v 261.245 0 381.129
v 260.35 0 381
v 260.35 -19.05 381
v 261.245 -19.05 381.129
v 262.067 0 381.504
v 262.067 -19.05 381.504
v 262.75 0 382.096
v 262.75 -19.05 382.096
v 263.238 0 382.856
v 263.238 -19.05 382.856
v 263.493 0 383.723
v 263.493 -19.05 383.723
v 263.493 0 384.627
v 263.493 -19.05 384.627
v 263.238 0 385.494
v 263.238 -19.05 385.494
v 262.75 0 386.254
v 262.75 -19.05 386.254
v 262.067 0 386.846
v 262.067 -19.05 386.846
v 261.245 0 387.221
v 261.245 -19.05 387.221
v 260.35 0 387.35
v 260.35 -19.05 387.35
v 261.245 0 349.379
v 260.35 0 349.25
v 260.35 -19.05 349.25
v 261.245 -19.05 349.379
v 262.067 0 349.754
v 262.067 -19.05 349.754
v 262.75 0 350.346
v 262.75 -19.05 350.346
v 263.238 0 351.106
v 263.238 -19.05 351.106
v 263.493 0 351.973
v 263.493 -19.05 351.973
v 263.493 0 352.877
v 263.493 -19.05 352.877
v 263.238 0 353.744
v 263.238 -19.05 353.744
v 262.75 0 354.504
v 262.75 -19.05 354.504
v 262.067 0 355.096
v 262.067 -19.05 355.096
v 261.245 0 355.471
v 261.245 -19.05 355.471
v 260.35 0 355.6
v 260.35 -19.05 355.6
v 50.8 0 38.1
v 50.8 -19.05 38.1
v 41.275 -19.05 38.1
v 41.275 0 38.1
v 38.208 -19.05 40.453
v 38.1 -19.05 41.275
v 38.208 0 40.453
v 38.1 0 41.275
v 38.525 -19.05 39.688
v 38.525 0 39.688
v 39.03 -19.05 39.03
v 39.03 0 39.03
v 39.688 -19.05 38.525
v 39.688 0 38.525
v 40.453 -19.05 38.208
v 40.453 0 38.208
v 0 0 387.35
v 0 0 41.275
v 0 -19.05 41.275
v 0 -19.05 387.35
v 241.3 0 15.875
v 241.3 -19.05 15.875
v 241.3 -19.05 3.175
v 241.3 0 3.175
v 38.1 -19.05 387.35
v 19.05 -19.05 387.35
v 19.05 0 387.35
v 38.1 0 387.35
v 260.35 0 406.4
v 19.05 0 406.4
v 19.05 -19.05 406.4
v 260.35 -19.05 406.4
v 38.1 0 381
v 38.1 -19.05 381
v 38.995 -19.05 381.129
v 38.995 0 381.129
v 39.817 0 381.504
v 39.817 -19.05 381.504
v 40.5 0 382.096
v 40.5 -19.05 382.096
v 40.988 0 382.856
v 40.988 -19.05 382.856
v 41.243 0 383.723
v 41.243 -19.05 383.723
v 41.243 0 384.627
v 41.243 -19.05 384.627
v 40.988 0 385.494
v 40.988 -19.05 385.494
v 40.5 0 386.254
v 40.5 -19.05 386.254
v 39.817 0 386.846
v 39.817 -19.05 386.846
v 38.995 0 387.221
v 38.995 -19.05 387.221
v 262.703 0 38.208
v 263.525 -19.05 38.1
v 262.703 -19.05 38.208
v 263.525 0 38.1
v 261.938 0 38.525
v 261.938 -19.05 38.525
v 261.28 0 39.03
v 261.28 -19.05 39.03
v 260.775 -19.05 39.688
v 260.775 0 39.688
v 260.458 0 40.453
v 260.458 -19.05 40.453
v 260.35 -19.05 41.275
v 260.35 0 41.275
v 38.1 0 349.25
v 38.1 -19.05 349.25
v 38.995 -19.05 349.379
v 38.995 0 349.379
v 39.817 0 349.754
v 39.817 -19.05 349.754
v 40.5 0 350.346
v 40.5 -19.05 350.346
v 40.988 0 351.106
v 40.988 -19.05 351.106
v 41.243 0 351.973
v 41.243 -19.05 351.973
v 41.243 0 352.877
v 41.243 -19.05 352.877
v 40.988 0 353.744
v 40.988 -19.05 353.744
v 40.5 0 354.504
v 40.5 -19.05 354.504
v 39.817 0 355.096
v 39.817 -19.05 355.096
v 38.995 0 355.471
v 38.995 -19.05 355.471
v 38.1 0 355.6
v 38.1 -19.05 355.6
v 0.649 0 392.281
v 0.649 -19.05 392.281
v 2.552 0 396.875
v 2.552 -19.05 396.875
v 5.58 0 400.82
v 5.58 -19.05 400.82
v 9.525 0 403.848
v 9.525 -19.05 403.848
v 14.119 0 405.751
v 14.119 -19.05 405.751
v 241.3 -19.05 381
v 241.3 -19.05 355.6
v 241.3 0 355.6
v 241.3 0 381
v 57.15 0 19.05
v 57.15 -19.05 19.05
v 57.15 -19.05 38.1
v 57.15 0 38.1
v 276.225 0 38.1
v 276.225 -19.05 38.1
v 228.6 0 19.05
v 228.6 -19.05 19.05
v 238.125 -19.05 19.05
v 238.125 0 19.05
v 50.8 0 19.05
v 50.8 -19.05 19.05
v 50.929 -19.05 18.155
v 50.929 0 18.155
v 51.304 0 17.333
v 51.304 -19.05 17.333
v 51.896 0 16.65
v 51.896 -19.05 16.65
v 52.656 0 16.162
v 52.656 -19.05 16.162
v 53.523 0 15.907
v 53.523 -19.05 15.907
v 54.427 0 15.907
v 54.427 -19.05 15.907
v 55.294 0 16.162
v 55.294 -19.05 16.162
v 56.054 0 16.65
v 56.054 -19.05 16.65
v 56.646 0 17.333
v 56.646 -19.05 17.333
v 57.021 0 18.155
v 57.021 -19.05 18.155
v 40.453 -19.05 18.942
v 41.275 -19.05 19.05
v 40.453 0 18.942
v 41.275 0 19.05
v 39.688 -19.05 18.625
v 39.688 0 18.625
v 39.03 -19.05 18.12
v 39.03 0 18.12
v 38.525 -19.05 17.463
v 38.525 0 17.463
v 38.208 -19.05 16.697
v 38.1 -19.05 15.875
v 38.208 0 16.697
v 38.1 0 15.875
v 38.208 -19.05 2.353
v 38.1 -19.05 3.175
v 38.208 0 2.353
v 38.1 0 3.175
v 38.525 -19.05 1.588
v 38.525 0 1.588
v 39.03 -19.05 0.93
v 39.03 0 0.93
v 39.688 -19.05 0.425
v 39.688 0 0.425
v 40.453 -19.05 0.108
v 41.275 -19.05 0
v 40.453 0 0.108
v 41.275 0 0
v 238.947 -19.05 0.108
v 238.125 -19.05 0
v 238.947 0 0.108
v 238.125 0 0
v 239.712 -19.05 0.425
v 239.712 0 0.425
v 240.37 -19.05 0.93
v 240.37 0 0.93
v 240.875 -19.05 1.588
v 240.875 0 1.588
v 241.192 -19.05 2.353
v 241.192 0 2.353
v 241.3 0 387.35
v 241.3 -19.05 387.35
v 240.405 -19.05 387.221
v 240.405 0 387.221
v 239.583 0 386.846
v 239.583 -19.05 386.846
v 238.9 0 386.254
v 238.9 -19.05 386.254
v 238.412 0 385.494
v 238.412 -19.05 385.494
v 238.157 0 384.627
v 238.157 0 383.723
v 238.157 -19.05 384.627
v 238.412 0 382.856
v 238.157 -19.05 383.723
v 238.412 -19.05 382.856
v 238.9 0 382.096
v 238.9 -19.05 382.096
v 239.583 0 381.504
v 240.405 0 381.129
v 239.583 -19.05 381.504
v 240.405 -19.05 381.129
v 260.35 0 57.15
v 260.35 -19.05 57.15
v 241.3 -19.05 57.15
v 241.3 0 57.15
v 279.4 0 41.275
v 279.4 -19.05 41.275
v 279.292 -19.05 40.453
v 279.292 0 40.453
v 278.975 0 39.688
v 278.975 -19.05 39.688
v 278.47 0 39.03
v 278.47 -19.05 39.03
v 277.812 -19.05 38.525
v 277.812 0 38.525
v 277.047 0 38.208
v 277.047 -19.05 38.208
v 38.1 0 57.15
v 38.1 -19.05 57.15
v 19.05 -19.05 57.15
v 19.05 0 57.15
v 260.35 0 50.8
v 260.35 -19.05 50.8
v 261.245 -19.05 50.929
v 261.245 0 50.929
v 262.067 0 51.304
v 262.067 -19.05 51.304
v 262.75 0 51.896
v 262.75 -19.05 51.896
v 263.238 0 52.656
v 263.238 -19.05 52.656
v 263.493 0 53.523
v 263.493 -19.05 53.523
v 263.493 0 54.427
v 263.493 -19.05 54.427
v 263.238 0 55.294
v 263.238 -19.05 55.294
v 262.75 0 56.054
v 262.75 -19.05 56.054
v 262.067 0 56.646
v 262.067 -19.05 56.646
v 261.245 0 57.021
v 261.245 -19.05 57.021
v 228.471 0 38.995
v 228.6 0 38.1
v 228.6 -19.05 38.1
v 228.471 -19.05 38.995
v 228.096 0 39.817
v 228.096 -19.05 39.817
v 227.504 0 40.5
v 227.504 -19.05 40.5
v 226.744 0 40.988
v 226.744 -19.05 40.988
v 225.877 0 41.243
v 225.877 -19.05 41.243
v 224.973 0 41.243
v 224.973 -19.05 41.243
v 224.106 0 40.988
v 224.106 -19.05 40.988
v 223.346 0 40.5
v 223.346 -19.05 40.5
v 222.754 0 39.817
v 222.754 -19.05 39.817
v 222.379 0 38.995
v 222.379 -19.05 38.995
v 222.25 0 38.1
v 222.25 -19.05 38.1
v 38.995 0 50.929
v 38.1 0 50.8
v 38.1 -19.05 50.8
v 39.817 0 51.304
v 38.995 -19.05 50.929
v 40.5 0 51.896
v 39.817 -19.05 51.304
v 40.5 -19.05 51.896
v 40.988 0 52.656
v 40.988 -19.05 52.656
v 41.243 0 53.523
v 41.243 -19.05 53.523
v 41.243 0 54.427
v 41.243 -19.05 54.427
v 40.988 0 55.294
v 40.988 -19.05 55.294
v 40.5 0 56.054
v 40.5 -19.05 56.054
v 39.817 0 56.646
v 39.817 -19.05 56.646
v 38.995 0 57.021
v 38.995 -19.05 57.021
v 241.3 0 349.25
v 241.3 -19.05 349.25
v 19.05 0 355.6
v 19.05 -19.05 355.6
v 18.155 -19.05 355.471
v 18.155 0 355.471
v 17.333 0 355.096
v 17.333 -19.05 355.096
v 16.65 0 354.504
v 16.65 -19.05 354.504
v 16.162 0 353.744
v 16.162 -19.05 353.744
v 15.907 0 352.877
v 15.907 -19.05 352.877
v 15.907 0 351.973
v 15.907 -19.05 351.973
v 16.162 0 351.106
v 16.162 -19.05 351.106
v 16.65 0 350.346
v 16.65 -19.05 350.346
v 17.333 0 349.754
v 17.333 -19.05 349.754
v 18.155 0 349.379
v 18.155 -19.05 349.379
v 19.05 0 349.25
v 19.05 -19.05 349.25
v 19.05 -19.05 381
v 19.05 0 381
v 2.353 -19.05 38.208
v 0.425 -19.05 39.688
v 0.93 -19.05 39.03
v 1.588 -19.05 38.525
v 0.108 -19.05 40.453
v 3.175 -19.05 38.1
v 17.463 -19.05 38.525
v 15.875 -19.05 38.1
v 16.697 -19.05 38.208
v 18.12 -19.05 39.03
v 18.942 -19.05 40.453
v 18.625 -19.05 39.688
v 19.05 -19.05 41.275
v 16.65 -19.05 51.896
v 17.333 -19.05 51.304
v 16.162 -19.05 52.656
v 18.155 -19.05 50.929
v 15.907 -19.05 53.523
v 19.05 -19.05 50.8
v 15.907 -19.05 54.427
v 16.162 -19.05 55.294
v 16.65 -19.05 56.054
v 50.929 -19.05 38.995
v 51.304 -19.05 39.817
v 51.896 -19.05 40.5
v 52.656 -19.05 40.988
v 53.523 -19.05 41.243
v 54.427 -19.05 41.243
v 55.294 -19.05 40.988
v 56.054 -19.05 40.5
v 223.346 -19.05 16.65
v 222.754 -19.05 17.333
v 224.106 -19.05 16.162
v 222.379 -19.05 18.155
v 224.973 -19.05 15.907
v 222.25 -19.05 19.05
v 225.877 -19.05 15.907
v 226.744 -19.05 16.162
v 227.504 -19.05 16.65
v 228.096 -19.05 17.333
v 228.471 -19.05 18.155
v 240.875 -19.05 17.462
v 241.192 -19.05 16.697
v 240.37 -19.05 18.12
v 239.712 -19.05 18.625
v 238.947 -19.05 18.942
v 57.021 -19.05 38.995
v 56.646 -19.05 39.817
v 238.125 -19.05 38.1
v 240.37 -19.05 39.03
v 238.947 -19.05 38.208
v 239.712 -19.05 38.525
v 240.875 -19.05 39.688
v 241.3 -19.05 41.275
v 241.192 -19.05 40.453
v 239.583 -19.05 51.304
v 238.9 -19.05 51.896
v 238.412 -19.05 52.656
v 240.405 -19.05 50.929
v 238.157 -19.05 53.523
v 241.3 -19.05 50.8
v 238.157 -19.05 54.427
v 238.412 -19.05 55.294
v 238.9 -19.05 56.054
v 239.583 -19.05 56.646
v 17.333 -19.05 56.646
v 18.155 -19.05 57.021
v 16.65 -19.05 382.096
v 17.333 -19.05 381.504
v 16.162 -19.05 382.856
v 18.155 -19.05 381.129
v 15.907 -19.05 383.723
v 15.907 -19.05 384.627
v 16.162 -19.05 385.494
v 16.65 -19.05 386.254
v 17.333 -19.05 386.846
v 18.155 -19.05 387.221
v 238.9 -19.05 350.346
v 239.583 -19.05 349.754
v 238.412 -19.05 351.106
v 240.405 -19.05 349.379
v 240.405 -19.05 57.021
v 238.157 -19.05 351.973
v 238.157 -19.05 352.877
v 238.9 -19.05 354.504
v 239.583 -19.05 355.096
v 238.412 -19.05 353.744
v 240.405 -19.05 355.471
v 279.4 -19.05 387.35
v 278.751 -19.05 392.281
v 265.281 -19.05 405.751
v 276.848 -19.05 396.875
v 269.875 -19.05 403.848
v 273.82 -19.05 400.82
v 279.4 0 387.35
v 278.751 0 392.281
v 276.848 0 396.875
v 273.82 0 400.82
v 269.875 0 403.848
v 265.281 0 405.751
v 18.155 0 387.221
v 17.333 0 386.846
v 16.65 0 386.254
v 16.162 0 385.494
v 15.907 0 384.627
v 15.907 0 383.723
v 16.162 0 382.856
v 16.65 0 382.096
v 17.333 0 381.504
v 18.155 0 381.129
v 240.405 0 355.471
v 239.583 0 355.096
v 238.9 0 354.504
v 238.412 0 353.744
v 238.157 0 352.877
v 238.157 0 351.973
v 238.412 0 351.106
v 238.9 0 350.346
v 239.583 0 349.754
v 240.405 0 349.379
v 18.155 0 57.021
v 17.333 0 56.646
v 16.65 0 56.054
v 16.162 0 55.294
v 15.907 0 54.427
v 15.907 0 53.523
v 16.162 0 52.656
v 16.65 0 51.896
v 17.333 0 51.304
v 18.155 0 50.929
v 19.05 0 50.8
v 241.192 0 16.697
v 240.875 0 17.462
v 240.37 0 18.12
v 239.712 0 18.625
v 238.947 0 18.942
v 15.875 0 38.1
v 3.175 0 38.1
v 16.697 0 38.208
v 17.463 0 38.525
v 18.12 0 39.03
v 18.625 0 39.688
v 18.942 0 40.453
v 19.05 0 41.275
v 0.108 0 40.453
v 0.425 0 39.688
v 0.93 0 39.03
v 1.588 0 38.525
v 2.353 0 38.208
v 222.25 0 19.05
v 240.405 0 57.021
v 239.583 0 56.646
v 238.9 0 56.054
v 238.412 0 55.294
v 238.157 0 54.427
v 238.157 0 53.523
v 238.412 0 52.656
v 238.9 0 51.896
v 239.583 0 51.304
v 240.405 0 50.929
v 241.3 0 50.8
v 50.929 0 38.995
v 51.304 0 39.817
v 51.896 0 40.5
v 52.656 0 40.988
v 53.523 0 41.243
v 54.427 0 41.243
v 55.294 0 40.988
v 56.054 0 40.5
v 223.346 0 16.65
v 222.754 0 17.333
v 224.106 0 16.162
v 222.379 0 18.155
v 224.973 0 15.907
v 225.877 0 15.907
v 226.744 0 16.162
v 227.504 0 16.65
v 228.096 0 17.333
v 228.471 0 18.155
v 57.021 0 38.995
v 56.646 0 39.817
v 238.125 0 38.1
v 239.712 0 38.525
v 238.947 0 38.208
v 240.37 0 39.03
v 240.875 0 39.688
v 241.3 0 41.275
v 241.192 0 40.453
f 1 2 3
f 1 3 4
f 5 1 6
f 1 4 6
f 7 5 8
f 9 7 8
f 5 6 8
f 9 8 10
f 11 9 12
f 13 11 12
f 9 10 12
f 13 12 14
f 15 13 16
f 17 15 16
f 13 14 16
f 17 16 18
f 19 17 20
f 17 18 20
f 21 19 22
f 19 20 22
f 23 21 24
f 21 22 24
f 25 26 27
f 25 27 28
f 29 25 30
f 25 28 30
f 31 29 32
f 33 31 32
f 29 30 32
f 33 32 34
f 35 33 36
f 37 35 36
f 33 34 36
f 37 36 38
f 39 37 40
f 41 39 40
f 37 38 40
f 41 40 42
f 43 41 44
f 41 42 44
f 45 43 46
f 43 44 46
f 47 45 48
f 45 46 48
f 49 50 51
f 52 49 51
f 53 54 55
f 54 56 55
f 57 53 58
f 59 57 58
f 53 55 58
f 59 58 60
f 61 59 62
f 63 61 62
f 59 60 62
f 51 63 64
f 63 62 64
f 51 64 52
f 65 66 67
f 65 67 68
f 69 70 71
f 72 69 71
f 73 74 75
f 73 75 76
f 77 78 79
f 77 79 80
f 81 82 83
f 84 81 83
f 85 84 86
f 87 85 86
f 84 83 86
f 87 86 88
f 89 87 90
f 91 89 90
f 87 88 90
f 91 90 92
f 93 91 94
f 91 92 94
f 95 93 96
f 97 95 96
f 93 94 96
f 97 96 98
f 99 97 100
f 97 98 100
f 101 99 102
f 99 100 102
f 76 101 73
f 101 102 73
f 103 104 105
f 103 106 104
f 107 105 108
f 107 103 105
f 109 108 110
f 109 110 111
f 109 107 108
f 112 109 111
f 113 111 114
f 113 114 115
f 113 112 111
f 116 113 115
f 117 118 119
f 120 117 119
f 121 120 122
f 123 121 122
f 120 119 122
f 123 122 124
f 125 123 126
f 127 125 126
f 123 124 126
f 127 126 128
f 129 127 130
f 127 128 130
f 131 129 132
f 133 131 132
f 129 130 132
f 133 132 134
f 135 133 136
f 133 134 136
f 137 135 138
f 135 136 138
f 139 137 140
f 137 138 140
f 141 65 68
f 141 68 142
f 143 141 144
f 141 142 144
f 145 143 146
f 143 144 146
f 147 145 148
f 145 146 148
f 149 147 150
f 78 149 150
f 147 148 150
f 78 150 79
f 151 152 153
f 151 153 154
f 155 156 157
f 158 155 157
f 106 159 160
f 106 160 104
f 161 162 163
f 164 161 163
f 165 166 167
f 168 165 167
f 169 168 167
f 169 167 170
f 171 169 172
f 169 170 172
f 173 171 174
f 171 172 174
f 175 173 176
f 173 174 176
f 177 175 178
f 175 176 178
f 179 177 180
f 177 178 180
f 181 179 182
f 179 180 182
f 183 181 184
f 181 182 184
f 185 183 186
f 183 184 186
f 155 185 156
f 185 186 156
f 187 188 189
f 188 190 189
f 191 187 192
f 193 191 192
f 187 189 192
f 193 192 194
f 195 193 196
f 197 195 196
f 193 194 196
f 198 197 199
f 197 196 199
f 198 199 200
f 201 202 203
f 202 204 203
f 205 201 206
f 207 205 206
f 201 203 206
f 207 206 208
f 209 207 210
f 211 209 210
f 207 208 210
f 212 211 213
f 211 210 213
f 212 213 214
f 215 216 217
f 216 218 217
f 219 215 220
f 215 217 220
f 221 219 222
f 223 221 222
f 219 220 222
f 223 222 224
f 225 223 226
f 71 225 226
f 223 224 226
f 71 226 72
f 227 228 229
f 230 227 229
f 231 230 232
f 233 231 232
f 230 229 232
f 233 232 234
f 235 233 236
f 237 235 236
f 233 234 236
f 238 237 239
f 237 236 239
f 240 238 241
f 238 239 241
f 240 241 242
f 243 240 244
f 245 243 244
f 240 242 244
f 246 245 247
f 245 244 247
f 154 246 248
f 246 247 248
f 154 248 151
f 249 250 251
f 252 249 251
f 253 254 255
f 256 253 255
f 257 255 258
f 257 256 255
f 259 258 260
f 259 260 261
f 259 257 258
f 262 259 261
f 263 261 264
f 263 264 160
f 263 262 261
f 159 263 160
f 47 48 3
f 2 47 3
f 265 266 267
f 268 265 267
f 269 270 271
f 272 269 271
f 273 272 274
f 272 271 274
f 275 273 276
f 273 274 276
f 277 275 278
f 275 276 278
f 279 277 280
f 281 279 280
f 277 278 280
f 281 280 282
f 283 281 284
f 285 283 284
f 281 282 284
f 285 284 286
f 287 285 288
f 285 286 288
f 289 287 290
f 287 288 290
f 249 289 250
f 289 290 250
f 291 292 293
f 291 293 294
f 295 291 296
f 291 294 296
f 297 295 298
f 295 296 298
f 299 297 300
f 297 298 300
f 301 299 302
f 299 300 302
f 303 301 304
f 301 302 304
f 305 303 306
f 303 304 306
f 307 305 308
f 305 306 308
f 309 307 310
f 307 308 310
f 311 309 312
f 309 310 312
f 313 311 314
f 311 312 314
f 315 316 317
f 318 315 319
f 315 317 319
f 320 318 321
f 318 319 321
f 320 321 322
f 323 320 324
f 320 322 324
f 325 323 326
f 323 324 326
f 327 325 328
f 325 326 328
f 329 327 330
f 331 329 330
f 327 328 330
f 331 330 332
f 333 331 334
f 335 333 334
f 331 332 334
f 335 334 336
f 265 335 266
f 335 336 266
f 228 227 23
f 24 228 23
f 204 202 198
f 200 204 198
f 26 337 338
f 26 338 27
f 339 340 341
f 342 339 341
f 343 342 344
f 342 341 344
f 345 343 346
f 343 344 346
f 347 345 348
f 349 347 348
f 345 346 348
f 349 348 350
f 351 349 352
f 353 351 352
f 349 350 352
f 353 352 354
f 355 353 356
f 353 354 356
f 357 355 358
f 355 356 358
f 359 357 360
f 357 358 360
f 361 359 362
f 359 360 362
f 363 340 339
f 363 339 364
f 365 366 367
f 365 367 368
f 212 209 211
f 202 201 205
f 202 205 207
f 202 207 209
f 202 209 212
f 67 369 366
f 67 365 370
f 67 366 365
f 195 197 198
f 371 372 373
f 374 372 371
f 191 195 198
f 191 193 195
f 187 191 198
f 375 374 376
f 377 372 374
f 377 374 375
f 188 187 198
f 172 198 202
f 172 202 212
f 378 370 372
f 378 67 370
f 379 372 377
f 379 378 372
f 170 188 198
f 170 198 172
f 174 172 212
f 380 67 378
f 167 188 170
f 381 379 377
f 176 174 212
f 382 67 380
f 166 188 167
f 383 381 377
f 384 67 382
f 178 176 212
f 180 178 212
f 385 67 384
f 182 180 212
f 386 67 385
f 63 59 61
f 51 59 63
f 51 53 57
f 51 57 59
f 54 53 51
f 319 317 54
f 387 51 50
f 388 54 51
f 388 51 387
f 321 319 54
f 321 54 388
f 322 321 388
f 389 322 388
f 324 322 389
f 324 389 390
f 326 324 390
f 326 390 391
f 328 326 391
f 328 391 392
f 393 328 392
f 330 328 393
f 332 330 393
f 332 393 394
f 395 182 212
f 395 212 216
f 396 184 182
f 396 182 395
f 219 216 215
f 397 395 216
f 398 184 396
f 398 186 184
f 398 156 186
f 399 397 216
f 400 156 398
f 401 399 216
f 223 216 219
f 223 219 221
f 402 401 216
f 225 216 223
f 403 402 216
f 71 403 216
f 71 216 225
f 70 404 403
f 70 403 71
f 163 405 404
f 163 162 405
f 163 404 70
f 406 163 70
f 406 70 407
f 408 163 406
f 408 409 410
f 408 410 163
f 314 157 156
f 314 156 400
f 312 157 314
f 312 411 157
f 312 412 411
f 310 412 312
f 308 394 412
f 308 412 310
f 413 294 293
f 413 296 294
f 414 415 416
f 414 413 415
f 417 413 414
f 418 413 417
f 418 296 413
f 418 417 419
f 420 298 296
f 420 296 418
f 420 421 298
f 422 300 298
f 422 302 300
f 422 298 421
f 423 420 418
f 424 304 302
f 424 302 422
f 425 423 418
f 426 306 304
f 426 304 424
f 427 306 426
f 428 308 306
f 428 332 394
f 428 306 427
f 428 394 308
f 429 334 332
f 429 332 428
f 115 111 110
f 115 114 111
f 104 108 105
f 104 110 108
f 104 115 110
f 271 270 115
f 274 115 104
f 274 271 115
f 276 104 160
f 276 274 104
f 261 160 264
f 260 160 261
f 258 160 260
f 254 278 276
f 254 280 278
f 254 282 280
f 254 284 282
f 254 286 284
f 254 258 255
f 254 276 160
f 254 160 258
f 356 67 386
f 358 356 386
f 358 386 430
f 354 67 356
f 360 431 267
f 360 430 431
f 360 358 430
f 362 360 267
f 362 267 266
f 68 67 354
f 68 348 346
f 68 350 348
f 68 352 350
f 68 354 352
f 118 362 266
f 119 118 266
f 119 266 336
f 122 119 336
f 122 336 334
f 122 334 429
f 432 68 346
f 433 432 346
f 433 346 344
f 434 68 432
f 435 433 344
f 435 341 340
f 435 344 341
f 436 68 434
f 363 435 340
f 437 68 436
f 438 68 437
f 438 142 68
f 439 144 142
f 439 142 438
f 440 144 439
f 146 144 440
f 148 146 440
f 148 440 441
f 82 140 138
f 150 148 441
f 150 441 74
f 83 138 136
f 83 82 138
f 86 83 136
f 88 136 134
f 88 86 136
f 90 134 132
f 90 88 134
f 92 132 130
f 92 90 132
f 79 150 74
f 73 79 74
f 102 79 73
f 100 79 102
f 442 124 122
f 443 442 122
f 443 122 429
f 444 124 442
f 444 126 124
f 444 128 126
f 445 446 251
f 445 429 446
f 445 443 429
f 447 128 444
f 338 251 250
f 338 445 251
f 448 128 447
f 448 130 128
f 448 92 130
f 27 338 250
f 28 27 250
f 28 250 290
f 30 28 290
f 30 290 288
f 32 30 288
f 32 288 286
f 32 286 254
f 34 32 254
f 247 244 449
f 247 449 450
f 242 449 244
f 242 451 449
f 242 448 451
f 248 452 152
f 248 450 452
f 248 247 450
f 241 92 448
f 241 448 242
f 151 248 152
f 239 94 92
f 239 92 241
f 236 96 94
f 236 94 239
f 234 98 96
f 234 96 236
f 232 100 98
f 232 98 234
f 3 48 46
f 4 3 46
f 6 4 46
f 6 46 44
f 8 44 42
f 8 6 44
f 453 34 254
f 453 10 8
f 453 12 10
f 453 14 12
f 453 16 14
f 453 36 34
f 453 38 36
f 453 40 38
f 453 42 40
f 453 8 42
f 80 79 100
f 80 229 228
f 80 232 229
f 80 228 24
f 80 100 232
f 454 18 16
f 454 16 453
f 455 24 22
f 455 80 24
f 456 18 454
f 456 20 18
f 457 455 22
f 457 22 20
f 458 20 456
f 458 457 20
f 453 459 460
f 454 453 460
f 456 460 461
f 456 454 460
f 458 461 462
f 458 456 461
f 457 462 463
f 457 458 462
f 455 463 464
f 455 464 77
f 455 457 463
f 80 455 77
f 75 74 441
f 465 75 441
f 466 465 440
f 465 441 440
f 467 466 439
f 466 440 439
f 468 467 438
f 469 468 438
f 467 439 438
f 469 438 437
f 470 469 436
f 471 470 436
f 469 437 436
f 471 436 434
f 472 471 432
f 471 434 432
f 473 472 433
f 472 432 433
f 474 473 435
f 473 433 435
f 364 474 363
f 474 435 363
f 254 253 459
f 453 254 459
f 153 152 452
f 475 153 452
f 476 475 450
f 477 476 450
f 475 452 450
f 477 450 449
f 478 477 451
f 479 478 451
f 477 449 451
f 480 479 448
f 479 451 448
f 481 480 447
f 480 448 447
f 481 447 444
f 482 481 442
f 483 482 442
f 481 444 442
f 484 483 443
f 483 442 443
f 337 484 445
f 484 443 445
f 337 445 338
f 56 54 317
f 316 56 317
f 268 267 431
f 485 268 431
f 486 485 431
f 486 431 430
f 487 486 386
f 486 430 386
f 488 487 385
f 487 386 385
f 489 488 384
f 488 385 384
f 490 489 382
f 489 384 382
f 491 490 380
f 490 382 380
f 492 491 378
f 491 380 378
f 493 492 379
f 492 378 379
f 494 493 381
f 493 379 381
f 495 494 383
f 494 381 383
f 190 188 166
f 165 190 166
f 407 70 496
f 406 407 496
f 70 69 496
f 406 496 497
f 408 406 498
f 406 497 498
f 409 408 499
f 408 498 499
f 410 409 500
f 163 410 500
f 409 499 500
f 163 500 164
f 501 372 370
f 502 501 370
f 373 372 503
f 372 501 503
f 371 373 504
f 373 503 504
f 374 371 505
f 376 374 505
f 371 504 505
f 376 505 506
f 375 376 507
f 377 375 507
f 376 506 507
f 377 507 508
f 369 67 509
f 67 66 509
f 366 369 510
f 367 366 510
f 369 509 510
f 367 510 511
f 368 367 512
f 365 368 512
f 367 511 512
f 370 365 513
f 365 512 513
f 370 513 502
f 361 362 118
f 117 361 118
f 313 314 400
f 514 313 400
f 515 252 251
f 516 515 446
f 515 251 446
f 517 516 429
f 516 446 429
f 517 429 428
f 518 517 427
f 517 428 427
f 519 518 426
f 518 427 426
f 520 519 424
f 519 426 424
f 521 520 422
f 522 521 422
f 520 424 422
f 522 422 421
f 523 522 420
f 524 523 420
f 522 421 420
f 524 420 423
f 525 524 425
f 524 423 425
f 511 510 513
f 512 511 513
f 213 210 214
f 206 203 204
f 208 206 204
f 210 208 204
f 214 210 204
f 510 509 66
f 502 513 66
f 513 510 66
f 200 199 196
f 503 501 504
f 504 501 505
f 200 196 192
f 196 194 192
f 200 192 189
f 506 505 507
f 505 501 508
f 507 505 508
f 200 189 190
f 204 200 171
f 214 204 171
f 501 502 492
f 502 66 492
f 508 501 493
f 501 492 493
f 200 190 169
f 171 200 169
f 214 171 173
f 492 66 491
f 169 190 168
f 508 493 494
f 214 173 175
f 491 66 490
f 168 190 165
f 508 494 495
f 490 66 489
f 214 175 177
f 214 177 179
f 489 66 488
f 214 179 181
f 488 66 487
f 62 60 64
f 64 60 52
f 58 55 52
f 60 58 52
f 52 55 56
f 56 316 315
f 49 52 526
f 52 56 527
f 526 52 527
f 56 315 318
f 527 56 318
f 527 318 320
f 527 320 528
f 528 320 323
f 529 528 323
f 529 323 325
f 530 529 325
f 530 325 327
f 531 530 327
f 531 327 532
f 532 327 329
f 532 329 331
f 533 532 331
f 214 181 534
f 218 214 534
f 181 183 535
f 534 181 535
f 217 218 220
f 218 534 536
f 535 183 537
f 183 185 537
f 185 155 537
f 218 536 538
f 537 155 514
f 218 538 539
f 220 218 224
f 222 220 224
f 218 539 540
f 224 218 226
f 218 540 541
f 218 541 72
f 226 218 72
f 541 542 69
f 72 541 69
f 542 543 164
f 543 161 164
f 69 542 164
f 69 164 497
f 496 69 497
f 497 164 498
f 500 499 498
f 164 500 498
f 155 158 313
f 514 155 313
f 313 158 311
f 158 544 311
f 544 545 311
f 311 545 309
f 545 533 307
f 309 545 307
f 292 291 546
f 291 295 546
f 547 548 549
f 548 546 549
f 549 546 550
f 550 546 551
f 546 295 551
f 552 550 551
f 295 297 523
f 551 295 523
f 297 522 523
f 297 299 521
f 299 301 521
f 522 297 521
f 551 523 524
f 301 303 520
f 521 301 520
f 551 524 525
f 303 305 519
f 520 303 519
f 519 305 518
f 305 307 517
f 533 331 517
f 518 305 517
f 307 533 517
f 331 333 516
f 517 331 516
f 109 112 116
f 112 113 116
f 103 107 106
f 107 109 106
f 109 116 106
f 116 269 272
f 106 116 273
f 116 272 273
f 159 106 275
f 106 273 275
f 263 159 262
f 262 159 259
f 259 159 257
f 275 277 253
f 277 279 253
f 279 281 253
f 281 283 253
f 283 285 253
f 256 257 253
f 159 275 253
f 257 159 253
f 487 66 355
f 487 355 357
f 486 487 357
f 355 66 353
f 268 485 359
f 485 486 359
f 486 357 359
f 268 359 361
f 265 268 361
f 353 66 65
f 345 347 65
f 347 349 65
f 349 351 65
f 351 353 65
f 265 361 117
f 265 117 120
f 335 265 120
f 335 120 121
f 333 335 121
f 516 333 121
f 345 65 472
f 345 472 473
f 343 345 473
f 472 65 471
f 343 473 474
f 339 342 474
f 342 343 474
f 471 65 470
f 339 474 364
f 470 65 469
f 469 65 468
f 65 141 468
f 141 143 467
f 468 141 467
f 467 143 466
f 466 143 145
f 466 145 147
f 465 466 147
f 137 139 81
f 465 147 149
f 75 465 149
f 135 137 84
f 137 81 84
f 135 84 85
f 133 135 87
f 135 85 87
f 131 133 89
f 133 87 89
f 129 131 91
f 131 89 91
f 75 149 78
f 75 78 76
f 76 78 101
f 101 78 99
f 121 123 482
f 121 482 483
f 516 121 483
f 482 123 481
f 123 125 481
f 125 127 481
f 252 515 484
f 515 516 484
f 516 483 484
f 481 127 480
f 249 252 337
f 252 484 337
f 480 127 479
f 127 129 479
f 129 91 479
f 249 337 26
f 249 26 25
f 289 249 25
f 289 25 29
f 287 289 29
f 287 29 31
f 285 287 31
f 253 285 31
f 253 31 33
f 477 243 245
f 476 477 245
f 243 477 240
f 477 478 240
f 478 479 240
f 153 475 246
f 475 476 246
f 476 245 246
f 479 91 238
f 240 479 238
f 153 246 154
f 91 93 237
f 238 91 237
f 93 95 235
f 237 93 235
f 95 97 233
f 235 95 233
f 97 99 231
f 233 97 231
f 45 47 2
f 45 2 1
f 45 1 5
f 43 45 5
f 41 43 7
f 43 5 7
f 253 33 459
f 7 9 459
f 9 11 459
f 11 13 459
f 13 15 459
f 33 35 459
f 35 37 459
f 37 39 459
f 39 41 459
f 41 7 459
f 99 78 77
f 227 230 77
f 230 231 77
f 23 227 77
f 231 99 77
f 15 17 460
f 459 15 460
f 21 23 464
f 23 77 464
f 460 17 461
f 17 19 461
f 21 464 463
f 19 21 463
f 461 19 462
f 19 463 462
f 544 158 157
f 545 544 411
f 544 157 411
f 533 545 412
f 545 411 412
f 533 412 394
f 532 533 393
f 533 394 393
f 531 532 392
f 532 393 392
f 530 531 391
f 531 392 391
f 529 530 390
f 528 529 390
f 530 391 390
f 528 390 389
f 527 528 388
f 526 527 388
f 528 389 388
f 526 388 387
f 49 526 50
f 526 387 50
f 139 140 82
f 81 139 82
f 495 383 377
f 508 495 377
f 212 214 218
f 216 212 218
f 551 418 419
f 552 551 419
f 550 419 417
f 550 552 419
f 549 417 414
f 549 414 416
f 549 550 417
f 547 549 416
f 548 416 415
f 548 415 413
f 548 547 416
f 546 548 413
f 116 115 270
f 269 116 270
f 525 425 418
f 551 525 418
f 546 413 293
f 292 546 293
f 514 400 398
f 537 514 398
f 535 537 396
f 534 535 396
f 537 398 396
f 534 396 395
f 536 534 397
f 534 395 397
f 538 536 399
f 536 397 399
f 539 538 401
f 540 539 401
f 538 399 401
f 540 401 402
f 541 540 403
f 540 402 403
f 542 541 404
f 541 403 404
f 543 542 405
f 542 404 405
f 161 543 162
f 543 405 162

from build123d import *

# Parameters (mm, degrees)
F0_W      = 279.4
F0_H      = 406.4
F1_DEPTH  = 19.05
F2_R      = 19.05
F4_DEPTH  = 19.05
F6_DEPTH  = 19.05
F7_W      = 19.05
F7_H      = 38.1
F8_DEPTH  = 19.05
F10_DEPTH = 19.05
F11_R     = 3.175


with BuildPart() as f1:
    # F0 (on Front) → F1 (new body)
    with BuildSketch(Plane.XZ):
        with Locations((139.7, 203.2)):
            Rectangle(F0_W, F0_H)
    extrude(amount=F1_DEPTH)

    # F2
    f2_edges = [f1.edges().sort_by_distance(p)[0] for p in [
        (0, -9.525, 406.4),
        (279.4, -9.525, 406.4),
    ]]
    fillet(f2_edges, radius=F2_R)

    # F3 (on face) → F4 (cut)
    with BuildSketch(Plane.XZ.offset(19.05)):
        Polygon((0, 0), (38.1, 0), (38.1, 19.05), (57.15, 19.05), (57.15, 38.1), (38.1, 38.1), (38.1, 57.15), (19.05, 57.15), (19.05, 38.1), (0, 38.1), align=None)
        Polygon((241.3, 19.05), (241.3, 0), (279.4, 0), (279.4, 38.1), (260.35, 38.1), (260.35, 57.15), (241.3, 57.15), (241.3, 38.1), (222.25, 38.1), (222.25, 19.05), align=None)
    extrude(amount=-F4_DEPTH, mode=Mode.SUBTRACT)

    # F5 (on face) → F6 (cut)
    with BuildSketch(Plane.XZ.offset(19.05)):
        with BuildLine():
            Line((19.05, 50.8), (19.05, 57.15))
            ThreePointArc((19.05, 57.15), (15.875, 53.975), (19.05, 50.8))
        make_face()
        with BuildLine():
            ThreePointArc((38.1, 50.8), (41.275, 53.975), (38.1, 57.15))
            Line((38.1, 57.15), (38.1, 50.8))
        make_face()
        with BuildLine():
            Line((50.8, 38.1), (57.15, 38.1))
            ThreePointArc((57.15, 38.1), (53.975, 41.275), (50.8, 38.1))
        make_face()
        with BuildLine():
            ThreePointArc((50.8, 19.05), (53.975, 15.875), (57.15, 19.05))
            Line((57.15, 19.05), (50.8, 19.05))
        make_face()
        with BuildLine():
            Line((228.6, 19.05), (222.25, 19.05))
            ThreePointArc((222.25, 19.05), (225.425, 15.875), (228.6, 19.05))
        make_face()
        with BuildLine():
            ThreePointArc((228.6, 38.1), (225.425, 41.275), (222.25, 38.1))
            Line((222.25, 38.1), (228.6, 38.1))
        make_face()
        with BuildLine():
            Line((241.3, 50.8), (241.3, 57.15))
            ThreePointArc((241.3, 57.15), (238.125, 53.975), (241.3, 50.8))
        make_face()
        with BuildLine():
            ThreePointArc((260.35, 50.8), (263.525, 53.975), (260.35, 57.15))
            Line((260.35, 57.15), (260.35, 50.8))
        make_face()
    extrude(amount=-F6_DEPTH, mode=Mode.SUBTRACT)

    # F7 (on face) → F8 (cut)
    with BuildSketch(Plane.XZ.offset(19.05)):
        with Locations((28.575, 368.3)):
            Rectangle(F7_W, F7_H)
        with Locations((250.825, 368.3)):
            Rectangle(F7_W, F7_H)
    extrude(amount=-F8_DEPTH, mode=Mode.SUBTRACT)

    # F9 (on face) → F10 (cut)
    with BuildSketch(Plane.XZ.offset(19.05)):
        with BuildLine():
            Line((19.05, 381), (19.05, 387.35))
            ThreePointArc((19.05, 387.35), (15.875, 384.175), (19.05, 381))
        make_face()
        with BuildLine():
            ThreePointArc((19.05, 355.6), (15.875, 352.425), (19.05, 349.25))
            Line((19.05, 349.25), (19.05, 355.6))
        make_face()
        with BuildLine():
            Line((38.1, 355.6), (38.1, 349.25))
            ThreePointArc((38.1, 349.25), (41.275, 352.425), (38.1, 355.6))
        make_face()
        with BuildLine():
            ThreePointArc((38.1, 381), (41.275, 384.175), (38.1, 387.35))
            Line((38.1, 387.35), (38.1, 381))
        make_face()
        with BuildLine():
            Line((241.3, 381), (241.3, 387.35))
            ThreePointArc((241.3, 387.35), (238.125, 384.175), (241.3, 381))
        make_face()
        with BuildLine():
            ThreePointArc((260.35, 381), (263.525, 384.175), (260.35, 387.35))
            Line((260.35, 387.35), (260.35, 381))
        make_face()
        with BuildLine():
            ThreePointArc((241.3, 355.6), (238.125, 352.425), (241.3, 349.25))
            Line((241.3, 349.25), (241.3, 355.6))
        make_face()
        with BuildLine():
            Line((260.35, 355.6), (260.35, 349.25))
            ThreePointArc((260.35, 349.25), (263.525, 352.425), (260.35, 355.6))
        make_face()
    extrude(amount=-F10_DEPTH, mode=Mode.SUBTRACT)

    # F11
    f11_edges = [f1.edges().sort_by_distance(p)[0] for p in [
        (0, -9.525, 38.1),
        (19.05, -9.525, 38.1),
        (38.1, -9.525, 38.1),
        (38.1, -9.525, 0),
        (241.3, -9.525, 0),
        (241.3, -9.525, 19.05),
        (241.3, -9.525, 38.1),
        (260.35, -9.525, 38.1),
        (279.4, -9.525, 38.1),
        (38.1, -9.525, 19.05),
    ]]
    fillet(f11_edges, radius=F11_R)


solid = f1.part
